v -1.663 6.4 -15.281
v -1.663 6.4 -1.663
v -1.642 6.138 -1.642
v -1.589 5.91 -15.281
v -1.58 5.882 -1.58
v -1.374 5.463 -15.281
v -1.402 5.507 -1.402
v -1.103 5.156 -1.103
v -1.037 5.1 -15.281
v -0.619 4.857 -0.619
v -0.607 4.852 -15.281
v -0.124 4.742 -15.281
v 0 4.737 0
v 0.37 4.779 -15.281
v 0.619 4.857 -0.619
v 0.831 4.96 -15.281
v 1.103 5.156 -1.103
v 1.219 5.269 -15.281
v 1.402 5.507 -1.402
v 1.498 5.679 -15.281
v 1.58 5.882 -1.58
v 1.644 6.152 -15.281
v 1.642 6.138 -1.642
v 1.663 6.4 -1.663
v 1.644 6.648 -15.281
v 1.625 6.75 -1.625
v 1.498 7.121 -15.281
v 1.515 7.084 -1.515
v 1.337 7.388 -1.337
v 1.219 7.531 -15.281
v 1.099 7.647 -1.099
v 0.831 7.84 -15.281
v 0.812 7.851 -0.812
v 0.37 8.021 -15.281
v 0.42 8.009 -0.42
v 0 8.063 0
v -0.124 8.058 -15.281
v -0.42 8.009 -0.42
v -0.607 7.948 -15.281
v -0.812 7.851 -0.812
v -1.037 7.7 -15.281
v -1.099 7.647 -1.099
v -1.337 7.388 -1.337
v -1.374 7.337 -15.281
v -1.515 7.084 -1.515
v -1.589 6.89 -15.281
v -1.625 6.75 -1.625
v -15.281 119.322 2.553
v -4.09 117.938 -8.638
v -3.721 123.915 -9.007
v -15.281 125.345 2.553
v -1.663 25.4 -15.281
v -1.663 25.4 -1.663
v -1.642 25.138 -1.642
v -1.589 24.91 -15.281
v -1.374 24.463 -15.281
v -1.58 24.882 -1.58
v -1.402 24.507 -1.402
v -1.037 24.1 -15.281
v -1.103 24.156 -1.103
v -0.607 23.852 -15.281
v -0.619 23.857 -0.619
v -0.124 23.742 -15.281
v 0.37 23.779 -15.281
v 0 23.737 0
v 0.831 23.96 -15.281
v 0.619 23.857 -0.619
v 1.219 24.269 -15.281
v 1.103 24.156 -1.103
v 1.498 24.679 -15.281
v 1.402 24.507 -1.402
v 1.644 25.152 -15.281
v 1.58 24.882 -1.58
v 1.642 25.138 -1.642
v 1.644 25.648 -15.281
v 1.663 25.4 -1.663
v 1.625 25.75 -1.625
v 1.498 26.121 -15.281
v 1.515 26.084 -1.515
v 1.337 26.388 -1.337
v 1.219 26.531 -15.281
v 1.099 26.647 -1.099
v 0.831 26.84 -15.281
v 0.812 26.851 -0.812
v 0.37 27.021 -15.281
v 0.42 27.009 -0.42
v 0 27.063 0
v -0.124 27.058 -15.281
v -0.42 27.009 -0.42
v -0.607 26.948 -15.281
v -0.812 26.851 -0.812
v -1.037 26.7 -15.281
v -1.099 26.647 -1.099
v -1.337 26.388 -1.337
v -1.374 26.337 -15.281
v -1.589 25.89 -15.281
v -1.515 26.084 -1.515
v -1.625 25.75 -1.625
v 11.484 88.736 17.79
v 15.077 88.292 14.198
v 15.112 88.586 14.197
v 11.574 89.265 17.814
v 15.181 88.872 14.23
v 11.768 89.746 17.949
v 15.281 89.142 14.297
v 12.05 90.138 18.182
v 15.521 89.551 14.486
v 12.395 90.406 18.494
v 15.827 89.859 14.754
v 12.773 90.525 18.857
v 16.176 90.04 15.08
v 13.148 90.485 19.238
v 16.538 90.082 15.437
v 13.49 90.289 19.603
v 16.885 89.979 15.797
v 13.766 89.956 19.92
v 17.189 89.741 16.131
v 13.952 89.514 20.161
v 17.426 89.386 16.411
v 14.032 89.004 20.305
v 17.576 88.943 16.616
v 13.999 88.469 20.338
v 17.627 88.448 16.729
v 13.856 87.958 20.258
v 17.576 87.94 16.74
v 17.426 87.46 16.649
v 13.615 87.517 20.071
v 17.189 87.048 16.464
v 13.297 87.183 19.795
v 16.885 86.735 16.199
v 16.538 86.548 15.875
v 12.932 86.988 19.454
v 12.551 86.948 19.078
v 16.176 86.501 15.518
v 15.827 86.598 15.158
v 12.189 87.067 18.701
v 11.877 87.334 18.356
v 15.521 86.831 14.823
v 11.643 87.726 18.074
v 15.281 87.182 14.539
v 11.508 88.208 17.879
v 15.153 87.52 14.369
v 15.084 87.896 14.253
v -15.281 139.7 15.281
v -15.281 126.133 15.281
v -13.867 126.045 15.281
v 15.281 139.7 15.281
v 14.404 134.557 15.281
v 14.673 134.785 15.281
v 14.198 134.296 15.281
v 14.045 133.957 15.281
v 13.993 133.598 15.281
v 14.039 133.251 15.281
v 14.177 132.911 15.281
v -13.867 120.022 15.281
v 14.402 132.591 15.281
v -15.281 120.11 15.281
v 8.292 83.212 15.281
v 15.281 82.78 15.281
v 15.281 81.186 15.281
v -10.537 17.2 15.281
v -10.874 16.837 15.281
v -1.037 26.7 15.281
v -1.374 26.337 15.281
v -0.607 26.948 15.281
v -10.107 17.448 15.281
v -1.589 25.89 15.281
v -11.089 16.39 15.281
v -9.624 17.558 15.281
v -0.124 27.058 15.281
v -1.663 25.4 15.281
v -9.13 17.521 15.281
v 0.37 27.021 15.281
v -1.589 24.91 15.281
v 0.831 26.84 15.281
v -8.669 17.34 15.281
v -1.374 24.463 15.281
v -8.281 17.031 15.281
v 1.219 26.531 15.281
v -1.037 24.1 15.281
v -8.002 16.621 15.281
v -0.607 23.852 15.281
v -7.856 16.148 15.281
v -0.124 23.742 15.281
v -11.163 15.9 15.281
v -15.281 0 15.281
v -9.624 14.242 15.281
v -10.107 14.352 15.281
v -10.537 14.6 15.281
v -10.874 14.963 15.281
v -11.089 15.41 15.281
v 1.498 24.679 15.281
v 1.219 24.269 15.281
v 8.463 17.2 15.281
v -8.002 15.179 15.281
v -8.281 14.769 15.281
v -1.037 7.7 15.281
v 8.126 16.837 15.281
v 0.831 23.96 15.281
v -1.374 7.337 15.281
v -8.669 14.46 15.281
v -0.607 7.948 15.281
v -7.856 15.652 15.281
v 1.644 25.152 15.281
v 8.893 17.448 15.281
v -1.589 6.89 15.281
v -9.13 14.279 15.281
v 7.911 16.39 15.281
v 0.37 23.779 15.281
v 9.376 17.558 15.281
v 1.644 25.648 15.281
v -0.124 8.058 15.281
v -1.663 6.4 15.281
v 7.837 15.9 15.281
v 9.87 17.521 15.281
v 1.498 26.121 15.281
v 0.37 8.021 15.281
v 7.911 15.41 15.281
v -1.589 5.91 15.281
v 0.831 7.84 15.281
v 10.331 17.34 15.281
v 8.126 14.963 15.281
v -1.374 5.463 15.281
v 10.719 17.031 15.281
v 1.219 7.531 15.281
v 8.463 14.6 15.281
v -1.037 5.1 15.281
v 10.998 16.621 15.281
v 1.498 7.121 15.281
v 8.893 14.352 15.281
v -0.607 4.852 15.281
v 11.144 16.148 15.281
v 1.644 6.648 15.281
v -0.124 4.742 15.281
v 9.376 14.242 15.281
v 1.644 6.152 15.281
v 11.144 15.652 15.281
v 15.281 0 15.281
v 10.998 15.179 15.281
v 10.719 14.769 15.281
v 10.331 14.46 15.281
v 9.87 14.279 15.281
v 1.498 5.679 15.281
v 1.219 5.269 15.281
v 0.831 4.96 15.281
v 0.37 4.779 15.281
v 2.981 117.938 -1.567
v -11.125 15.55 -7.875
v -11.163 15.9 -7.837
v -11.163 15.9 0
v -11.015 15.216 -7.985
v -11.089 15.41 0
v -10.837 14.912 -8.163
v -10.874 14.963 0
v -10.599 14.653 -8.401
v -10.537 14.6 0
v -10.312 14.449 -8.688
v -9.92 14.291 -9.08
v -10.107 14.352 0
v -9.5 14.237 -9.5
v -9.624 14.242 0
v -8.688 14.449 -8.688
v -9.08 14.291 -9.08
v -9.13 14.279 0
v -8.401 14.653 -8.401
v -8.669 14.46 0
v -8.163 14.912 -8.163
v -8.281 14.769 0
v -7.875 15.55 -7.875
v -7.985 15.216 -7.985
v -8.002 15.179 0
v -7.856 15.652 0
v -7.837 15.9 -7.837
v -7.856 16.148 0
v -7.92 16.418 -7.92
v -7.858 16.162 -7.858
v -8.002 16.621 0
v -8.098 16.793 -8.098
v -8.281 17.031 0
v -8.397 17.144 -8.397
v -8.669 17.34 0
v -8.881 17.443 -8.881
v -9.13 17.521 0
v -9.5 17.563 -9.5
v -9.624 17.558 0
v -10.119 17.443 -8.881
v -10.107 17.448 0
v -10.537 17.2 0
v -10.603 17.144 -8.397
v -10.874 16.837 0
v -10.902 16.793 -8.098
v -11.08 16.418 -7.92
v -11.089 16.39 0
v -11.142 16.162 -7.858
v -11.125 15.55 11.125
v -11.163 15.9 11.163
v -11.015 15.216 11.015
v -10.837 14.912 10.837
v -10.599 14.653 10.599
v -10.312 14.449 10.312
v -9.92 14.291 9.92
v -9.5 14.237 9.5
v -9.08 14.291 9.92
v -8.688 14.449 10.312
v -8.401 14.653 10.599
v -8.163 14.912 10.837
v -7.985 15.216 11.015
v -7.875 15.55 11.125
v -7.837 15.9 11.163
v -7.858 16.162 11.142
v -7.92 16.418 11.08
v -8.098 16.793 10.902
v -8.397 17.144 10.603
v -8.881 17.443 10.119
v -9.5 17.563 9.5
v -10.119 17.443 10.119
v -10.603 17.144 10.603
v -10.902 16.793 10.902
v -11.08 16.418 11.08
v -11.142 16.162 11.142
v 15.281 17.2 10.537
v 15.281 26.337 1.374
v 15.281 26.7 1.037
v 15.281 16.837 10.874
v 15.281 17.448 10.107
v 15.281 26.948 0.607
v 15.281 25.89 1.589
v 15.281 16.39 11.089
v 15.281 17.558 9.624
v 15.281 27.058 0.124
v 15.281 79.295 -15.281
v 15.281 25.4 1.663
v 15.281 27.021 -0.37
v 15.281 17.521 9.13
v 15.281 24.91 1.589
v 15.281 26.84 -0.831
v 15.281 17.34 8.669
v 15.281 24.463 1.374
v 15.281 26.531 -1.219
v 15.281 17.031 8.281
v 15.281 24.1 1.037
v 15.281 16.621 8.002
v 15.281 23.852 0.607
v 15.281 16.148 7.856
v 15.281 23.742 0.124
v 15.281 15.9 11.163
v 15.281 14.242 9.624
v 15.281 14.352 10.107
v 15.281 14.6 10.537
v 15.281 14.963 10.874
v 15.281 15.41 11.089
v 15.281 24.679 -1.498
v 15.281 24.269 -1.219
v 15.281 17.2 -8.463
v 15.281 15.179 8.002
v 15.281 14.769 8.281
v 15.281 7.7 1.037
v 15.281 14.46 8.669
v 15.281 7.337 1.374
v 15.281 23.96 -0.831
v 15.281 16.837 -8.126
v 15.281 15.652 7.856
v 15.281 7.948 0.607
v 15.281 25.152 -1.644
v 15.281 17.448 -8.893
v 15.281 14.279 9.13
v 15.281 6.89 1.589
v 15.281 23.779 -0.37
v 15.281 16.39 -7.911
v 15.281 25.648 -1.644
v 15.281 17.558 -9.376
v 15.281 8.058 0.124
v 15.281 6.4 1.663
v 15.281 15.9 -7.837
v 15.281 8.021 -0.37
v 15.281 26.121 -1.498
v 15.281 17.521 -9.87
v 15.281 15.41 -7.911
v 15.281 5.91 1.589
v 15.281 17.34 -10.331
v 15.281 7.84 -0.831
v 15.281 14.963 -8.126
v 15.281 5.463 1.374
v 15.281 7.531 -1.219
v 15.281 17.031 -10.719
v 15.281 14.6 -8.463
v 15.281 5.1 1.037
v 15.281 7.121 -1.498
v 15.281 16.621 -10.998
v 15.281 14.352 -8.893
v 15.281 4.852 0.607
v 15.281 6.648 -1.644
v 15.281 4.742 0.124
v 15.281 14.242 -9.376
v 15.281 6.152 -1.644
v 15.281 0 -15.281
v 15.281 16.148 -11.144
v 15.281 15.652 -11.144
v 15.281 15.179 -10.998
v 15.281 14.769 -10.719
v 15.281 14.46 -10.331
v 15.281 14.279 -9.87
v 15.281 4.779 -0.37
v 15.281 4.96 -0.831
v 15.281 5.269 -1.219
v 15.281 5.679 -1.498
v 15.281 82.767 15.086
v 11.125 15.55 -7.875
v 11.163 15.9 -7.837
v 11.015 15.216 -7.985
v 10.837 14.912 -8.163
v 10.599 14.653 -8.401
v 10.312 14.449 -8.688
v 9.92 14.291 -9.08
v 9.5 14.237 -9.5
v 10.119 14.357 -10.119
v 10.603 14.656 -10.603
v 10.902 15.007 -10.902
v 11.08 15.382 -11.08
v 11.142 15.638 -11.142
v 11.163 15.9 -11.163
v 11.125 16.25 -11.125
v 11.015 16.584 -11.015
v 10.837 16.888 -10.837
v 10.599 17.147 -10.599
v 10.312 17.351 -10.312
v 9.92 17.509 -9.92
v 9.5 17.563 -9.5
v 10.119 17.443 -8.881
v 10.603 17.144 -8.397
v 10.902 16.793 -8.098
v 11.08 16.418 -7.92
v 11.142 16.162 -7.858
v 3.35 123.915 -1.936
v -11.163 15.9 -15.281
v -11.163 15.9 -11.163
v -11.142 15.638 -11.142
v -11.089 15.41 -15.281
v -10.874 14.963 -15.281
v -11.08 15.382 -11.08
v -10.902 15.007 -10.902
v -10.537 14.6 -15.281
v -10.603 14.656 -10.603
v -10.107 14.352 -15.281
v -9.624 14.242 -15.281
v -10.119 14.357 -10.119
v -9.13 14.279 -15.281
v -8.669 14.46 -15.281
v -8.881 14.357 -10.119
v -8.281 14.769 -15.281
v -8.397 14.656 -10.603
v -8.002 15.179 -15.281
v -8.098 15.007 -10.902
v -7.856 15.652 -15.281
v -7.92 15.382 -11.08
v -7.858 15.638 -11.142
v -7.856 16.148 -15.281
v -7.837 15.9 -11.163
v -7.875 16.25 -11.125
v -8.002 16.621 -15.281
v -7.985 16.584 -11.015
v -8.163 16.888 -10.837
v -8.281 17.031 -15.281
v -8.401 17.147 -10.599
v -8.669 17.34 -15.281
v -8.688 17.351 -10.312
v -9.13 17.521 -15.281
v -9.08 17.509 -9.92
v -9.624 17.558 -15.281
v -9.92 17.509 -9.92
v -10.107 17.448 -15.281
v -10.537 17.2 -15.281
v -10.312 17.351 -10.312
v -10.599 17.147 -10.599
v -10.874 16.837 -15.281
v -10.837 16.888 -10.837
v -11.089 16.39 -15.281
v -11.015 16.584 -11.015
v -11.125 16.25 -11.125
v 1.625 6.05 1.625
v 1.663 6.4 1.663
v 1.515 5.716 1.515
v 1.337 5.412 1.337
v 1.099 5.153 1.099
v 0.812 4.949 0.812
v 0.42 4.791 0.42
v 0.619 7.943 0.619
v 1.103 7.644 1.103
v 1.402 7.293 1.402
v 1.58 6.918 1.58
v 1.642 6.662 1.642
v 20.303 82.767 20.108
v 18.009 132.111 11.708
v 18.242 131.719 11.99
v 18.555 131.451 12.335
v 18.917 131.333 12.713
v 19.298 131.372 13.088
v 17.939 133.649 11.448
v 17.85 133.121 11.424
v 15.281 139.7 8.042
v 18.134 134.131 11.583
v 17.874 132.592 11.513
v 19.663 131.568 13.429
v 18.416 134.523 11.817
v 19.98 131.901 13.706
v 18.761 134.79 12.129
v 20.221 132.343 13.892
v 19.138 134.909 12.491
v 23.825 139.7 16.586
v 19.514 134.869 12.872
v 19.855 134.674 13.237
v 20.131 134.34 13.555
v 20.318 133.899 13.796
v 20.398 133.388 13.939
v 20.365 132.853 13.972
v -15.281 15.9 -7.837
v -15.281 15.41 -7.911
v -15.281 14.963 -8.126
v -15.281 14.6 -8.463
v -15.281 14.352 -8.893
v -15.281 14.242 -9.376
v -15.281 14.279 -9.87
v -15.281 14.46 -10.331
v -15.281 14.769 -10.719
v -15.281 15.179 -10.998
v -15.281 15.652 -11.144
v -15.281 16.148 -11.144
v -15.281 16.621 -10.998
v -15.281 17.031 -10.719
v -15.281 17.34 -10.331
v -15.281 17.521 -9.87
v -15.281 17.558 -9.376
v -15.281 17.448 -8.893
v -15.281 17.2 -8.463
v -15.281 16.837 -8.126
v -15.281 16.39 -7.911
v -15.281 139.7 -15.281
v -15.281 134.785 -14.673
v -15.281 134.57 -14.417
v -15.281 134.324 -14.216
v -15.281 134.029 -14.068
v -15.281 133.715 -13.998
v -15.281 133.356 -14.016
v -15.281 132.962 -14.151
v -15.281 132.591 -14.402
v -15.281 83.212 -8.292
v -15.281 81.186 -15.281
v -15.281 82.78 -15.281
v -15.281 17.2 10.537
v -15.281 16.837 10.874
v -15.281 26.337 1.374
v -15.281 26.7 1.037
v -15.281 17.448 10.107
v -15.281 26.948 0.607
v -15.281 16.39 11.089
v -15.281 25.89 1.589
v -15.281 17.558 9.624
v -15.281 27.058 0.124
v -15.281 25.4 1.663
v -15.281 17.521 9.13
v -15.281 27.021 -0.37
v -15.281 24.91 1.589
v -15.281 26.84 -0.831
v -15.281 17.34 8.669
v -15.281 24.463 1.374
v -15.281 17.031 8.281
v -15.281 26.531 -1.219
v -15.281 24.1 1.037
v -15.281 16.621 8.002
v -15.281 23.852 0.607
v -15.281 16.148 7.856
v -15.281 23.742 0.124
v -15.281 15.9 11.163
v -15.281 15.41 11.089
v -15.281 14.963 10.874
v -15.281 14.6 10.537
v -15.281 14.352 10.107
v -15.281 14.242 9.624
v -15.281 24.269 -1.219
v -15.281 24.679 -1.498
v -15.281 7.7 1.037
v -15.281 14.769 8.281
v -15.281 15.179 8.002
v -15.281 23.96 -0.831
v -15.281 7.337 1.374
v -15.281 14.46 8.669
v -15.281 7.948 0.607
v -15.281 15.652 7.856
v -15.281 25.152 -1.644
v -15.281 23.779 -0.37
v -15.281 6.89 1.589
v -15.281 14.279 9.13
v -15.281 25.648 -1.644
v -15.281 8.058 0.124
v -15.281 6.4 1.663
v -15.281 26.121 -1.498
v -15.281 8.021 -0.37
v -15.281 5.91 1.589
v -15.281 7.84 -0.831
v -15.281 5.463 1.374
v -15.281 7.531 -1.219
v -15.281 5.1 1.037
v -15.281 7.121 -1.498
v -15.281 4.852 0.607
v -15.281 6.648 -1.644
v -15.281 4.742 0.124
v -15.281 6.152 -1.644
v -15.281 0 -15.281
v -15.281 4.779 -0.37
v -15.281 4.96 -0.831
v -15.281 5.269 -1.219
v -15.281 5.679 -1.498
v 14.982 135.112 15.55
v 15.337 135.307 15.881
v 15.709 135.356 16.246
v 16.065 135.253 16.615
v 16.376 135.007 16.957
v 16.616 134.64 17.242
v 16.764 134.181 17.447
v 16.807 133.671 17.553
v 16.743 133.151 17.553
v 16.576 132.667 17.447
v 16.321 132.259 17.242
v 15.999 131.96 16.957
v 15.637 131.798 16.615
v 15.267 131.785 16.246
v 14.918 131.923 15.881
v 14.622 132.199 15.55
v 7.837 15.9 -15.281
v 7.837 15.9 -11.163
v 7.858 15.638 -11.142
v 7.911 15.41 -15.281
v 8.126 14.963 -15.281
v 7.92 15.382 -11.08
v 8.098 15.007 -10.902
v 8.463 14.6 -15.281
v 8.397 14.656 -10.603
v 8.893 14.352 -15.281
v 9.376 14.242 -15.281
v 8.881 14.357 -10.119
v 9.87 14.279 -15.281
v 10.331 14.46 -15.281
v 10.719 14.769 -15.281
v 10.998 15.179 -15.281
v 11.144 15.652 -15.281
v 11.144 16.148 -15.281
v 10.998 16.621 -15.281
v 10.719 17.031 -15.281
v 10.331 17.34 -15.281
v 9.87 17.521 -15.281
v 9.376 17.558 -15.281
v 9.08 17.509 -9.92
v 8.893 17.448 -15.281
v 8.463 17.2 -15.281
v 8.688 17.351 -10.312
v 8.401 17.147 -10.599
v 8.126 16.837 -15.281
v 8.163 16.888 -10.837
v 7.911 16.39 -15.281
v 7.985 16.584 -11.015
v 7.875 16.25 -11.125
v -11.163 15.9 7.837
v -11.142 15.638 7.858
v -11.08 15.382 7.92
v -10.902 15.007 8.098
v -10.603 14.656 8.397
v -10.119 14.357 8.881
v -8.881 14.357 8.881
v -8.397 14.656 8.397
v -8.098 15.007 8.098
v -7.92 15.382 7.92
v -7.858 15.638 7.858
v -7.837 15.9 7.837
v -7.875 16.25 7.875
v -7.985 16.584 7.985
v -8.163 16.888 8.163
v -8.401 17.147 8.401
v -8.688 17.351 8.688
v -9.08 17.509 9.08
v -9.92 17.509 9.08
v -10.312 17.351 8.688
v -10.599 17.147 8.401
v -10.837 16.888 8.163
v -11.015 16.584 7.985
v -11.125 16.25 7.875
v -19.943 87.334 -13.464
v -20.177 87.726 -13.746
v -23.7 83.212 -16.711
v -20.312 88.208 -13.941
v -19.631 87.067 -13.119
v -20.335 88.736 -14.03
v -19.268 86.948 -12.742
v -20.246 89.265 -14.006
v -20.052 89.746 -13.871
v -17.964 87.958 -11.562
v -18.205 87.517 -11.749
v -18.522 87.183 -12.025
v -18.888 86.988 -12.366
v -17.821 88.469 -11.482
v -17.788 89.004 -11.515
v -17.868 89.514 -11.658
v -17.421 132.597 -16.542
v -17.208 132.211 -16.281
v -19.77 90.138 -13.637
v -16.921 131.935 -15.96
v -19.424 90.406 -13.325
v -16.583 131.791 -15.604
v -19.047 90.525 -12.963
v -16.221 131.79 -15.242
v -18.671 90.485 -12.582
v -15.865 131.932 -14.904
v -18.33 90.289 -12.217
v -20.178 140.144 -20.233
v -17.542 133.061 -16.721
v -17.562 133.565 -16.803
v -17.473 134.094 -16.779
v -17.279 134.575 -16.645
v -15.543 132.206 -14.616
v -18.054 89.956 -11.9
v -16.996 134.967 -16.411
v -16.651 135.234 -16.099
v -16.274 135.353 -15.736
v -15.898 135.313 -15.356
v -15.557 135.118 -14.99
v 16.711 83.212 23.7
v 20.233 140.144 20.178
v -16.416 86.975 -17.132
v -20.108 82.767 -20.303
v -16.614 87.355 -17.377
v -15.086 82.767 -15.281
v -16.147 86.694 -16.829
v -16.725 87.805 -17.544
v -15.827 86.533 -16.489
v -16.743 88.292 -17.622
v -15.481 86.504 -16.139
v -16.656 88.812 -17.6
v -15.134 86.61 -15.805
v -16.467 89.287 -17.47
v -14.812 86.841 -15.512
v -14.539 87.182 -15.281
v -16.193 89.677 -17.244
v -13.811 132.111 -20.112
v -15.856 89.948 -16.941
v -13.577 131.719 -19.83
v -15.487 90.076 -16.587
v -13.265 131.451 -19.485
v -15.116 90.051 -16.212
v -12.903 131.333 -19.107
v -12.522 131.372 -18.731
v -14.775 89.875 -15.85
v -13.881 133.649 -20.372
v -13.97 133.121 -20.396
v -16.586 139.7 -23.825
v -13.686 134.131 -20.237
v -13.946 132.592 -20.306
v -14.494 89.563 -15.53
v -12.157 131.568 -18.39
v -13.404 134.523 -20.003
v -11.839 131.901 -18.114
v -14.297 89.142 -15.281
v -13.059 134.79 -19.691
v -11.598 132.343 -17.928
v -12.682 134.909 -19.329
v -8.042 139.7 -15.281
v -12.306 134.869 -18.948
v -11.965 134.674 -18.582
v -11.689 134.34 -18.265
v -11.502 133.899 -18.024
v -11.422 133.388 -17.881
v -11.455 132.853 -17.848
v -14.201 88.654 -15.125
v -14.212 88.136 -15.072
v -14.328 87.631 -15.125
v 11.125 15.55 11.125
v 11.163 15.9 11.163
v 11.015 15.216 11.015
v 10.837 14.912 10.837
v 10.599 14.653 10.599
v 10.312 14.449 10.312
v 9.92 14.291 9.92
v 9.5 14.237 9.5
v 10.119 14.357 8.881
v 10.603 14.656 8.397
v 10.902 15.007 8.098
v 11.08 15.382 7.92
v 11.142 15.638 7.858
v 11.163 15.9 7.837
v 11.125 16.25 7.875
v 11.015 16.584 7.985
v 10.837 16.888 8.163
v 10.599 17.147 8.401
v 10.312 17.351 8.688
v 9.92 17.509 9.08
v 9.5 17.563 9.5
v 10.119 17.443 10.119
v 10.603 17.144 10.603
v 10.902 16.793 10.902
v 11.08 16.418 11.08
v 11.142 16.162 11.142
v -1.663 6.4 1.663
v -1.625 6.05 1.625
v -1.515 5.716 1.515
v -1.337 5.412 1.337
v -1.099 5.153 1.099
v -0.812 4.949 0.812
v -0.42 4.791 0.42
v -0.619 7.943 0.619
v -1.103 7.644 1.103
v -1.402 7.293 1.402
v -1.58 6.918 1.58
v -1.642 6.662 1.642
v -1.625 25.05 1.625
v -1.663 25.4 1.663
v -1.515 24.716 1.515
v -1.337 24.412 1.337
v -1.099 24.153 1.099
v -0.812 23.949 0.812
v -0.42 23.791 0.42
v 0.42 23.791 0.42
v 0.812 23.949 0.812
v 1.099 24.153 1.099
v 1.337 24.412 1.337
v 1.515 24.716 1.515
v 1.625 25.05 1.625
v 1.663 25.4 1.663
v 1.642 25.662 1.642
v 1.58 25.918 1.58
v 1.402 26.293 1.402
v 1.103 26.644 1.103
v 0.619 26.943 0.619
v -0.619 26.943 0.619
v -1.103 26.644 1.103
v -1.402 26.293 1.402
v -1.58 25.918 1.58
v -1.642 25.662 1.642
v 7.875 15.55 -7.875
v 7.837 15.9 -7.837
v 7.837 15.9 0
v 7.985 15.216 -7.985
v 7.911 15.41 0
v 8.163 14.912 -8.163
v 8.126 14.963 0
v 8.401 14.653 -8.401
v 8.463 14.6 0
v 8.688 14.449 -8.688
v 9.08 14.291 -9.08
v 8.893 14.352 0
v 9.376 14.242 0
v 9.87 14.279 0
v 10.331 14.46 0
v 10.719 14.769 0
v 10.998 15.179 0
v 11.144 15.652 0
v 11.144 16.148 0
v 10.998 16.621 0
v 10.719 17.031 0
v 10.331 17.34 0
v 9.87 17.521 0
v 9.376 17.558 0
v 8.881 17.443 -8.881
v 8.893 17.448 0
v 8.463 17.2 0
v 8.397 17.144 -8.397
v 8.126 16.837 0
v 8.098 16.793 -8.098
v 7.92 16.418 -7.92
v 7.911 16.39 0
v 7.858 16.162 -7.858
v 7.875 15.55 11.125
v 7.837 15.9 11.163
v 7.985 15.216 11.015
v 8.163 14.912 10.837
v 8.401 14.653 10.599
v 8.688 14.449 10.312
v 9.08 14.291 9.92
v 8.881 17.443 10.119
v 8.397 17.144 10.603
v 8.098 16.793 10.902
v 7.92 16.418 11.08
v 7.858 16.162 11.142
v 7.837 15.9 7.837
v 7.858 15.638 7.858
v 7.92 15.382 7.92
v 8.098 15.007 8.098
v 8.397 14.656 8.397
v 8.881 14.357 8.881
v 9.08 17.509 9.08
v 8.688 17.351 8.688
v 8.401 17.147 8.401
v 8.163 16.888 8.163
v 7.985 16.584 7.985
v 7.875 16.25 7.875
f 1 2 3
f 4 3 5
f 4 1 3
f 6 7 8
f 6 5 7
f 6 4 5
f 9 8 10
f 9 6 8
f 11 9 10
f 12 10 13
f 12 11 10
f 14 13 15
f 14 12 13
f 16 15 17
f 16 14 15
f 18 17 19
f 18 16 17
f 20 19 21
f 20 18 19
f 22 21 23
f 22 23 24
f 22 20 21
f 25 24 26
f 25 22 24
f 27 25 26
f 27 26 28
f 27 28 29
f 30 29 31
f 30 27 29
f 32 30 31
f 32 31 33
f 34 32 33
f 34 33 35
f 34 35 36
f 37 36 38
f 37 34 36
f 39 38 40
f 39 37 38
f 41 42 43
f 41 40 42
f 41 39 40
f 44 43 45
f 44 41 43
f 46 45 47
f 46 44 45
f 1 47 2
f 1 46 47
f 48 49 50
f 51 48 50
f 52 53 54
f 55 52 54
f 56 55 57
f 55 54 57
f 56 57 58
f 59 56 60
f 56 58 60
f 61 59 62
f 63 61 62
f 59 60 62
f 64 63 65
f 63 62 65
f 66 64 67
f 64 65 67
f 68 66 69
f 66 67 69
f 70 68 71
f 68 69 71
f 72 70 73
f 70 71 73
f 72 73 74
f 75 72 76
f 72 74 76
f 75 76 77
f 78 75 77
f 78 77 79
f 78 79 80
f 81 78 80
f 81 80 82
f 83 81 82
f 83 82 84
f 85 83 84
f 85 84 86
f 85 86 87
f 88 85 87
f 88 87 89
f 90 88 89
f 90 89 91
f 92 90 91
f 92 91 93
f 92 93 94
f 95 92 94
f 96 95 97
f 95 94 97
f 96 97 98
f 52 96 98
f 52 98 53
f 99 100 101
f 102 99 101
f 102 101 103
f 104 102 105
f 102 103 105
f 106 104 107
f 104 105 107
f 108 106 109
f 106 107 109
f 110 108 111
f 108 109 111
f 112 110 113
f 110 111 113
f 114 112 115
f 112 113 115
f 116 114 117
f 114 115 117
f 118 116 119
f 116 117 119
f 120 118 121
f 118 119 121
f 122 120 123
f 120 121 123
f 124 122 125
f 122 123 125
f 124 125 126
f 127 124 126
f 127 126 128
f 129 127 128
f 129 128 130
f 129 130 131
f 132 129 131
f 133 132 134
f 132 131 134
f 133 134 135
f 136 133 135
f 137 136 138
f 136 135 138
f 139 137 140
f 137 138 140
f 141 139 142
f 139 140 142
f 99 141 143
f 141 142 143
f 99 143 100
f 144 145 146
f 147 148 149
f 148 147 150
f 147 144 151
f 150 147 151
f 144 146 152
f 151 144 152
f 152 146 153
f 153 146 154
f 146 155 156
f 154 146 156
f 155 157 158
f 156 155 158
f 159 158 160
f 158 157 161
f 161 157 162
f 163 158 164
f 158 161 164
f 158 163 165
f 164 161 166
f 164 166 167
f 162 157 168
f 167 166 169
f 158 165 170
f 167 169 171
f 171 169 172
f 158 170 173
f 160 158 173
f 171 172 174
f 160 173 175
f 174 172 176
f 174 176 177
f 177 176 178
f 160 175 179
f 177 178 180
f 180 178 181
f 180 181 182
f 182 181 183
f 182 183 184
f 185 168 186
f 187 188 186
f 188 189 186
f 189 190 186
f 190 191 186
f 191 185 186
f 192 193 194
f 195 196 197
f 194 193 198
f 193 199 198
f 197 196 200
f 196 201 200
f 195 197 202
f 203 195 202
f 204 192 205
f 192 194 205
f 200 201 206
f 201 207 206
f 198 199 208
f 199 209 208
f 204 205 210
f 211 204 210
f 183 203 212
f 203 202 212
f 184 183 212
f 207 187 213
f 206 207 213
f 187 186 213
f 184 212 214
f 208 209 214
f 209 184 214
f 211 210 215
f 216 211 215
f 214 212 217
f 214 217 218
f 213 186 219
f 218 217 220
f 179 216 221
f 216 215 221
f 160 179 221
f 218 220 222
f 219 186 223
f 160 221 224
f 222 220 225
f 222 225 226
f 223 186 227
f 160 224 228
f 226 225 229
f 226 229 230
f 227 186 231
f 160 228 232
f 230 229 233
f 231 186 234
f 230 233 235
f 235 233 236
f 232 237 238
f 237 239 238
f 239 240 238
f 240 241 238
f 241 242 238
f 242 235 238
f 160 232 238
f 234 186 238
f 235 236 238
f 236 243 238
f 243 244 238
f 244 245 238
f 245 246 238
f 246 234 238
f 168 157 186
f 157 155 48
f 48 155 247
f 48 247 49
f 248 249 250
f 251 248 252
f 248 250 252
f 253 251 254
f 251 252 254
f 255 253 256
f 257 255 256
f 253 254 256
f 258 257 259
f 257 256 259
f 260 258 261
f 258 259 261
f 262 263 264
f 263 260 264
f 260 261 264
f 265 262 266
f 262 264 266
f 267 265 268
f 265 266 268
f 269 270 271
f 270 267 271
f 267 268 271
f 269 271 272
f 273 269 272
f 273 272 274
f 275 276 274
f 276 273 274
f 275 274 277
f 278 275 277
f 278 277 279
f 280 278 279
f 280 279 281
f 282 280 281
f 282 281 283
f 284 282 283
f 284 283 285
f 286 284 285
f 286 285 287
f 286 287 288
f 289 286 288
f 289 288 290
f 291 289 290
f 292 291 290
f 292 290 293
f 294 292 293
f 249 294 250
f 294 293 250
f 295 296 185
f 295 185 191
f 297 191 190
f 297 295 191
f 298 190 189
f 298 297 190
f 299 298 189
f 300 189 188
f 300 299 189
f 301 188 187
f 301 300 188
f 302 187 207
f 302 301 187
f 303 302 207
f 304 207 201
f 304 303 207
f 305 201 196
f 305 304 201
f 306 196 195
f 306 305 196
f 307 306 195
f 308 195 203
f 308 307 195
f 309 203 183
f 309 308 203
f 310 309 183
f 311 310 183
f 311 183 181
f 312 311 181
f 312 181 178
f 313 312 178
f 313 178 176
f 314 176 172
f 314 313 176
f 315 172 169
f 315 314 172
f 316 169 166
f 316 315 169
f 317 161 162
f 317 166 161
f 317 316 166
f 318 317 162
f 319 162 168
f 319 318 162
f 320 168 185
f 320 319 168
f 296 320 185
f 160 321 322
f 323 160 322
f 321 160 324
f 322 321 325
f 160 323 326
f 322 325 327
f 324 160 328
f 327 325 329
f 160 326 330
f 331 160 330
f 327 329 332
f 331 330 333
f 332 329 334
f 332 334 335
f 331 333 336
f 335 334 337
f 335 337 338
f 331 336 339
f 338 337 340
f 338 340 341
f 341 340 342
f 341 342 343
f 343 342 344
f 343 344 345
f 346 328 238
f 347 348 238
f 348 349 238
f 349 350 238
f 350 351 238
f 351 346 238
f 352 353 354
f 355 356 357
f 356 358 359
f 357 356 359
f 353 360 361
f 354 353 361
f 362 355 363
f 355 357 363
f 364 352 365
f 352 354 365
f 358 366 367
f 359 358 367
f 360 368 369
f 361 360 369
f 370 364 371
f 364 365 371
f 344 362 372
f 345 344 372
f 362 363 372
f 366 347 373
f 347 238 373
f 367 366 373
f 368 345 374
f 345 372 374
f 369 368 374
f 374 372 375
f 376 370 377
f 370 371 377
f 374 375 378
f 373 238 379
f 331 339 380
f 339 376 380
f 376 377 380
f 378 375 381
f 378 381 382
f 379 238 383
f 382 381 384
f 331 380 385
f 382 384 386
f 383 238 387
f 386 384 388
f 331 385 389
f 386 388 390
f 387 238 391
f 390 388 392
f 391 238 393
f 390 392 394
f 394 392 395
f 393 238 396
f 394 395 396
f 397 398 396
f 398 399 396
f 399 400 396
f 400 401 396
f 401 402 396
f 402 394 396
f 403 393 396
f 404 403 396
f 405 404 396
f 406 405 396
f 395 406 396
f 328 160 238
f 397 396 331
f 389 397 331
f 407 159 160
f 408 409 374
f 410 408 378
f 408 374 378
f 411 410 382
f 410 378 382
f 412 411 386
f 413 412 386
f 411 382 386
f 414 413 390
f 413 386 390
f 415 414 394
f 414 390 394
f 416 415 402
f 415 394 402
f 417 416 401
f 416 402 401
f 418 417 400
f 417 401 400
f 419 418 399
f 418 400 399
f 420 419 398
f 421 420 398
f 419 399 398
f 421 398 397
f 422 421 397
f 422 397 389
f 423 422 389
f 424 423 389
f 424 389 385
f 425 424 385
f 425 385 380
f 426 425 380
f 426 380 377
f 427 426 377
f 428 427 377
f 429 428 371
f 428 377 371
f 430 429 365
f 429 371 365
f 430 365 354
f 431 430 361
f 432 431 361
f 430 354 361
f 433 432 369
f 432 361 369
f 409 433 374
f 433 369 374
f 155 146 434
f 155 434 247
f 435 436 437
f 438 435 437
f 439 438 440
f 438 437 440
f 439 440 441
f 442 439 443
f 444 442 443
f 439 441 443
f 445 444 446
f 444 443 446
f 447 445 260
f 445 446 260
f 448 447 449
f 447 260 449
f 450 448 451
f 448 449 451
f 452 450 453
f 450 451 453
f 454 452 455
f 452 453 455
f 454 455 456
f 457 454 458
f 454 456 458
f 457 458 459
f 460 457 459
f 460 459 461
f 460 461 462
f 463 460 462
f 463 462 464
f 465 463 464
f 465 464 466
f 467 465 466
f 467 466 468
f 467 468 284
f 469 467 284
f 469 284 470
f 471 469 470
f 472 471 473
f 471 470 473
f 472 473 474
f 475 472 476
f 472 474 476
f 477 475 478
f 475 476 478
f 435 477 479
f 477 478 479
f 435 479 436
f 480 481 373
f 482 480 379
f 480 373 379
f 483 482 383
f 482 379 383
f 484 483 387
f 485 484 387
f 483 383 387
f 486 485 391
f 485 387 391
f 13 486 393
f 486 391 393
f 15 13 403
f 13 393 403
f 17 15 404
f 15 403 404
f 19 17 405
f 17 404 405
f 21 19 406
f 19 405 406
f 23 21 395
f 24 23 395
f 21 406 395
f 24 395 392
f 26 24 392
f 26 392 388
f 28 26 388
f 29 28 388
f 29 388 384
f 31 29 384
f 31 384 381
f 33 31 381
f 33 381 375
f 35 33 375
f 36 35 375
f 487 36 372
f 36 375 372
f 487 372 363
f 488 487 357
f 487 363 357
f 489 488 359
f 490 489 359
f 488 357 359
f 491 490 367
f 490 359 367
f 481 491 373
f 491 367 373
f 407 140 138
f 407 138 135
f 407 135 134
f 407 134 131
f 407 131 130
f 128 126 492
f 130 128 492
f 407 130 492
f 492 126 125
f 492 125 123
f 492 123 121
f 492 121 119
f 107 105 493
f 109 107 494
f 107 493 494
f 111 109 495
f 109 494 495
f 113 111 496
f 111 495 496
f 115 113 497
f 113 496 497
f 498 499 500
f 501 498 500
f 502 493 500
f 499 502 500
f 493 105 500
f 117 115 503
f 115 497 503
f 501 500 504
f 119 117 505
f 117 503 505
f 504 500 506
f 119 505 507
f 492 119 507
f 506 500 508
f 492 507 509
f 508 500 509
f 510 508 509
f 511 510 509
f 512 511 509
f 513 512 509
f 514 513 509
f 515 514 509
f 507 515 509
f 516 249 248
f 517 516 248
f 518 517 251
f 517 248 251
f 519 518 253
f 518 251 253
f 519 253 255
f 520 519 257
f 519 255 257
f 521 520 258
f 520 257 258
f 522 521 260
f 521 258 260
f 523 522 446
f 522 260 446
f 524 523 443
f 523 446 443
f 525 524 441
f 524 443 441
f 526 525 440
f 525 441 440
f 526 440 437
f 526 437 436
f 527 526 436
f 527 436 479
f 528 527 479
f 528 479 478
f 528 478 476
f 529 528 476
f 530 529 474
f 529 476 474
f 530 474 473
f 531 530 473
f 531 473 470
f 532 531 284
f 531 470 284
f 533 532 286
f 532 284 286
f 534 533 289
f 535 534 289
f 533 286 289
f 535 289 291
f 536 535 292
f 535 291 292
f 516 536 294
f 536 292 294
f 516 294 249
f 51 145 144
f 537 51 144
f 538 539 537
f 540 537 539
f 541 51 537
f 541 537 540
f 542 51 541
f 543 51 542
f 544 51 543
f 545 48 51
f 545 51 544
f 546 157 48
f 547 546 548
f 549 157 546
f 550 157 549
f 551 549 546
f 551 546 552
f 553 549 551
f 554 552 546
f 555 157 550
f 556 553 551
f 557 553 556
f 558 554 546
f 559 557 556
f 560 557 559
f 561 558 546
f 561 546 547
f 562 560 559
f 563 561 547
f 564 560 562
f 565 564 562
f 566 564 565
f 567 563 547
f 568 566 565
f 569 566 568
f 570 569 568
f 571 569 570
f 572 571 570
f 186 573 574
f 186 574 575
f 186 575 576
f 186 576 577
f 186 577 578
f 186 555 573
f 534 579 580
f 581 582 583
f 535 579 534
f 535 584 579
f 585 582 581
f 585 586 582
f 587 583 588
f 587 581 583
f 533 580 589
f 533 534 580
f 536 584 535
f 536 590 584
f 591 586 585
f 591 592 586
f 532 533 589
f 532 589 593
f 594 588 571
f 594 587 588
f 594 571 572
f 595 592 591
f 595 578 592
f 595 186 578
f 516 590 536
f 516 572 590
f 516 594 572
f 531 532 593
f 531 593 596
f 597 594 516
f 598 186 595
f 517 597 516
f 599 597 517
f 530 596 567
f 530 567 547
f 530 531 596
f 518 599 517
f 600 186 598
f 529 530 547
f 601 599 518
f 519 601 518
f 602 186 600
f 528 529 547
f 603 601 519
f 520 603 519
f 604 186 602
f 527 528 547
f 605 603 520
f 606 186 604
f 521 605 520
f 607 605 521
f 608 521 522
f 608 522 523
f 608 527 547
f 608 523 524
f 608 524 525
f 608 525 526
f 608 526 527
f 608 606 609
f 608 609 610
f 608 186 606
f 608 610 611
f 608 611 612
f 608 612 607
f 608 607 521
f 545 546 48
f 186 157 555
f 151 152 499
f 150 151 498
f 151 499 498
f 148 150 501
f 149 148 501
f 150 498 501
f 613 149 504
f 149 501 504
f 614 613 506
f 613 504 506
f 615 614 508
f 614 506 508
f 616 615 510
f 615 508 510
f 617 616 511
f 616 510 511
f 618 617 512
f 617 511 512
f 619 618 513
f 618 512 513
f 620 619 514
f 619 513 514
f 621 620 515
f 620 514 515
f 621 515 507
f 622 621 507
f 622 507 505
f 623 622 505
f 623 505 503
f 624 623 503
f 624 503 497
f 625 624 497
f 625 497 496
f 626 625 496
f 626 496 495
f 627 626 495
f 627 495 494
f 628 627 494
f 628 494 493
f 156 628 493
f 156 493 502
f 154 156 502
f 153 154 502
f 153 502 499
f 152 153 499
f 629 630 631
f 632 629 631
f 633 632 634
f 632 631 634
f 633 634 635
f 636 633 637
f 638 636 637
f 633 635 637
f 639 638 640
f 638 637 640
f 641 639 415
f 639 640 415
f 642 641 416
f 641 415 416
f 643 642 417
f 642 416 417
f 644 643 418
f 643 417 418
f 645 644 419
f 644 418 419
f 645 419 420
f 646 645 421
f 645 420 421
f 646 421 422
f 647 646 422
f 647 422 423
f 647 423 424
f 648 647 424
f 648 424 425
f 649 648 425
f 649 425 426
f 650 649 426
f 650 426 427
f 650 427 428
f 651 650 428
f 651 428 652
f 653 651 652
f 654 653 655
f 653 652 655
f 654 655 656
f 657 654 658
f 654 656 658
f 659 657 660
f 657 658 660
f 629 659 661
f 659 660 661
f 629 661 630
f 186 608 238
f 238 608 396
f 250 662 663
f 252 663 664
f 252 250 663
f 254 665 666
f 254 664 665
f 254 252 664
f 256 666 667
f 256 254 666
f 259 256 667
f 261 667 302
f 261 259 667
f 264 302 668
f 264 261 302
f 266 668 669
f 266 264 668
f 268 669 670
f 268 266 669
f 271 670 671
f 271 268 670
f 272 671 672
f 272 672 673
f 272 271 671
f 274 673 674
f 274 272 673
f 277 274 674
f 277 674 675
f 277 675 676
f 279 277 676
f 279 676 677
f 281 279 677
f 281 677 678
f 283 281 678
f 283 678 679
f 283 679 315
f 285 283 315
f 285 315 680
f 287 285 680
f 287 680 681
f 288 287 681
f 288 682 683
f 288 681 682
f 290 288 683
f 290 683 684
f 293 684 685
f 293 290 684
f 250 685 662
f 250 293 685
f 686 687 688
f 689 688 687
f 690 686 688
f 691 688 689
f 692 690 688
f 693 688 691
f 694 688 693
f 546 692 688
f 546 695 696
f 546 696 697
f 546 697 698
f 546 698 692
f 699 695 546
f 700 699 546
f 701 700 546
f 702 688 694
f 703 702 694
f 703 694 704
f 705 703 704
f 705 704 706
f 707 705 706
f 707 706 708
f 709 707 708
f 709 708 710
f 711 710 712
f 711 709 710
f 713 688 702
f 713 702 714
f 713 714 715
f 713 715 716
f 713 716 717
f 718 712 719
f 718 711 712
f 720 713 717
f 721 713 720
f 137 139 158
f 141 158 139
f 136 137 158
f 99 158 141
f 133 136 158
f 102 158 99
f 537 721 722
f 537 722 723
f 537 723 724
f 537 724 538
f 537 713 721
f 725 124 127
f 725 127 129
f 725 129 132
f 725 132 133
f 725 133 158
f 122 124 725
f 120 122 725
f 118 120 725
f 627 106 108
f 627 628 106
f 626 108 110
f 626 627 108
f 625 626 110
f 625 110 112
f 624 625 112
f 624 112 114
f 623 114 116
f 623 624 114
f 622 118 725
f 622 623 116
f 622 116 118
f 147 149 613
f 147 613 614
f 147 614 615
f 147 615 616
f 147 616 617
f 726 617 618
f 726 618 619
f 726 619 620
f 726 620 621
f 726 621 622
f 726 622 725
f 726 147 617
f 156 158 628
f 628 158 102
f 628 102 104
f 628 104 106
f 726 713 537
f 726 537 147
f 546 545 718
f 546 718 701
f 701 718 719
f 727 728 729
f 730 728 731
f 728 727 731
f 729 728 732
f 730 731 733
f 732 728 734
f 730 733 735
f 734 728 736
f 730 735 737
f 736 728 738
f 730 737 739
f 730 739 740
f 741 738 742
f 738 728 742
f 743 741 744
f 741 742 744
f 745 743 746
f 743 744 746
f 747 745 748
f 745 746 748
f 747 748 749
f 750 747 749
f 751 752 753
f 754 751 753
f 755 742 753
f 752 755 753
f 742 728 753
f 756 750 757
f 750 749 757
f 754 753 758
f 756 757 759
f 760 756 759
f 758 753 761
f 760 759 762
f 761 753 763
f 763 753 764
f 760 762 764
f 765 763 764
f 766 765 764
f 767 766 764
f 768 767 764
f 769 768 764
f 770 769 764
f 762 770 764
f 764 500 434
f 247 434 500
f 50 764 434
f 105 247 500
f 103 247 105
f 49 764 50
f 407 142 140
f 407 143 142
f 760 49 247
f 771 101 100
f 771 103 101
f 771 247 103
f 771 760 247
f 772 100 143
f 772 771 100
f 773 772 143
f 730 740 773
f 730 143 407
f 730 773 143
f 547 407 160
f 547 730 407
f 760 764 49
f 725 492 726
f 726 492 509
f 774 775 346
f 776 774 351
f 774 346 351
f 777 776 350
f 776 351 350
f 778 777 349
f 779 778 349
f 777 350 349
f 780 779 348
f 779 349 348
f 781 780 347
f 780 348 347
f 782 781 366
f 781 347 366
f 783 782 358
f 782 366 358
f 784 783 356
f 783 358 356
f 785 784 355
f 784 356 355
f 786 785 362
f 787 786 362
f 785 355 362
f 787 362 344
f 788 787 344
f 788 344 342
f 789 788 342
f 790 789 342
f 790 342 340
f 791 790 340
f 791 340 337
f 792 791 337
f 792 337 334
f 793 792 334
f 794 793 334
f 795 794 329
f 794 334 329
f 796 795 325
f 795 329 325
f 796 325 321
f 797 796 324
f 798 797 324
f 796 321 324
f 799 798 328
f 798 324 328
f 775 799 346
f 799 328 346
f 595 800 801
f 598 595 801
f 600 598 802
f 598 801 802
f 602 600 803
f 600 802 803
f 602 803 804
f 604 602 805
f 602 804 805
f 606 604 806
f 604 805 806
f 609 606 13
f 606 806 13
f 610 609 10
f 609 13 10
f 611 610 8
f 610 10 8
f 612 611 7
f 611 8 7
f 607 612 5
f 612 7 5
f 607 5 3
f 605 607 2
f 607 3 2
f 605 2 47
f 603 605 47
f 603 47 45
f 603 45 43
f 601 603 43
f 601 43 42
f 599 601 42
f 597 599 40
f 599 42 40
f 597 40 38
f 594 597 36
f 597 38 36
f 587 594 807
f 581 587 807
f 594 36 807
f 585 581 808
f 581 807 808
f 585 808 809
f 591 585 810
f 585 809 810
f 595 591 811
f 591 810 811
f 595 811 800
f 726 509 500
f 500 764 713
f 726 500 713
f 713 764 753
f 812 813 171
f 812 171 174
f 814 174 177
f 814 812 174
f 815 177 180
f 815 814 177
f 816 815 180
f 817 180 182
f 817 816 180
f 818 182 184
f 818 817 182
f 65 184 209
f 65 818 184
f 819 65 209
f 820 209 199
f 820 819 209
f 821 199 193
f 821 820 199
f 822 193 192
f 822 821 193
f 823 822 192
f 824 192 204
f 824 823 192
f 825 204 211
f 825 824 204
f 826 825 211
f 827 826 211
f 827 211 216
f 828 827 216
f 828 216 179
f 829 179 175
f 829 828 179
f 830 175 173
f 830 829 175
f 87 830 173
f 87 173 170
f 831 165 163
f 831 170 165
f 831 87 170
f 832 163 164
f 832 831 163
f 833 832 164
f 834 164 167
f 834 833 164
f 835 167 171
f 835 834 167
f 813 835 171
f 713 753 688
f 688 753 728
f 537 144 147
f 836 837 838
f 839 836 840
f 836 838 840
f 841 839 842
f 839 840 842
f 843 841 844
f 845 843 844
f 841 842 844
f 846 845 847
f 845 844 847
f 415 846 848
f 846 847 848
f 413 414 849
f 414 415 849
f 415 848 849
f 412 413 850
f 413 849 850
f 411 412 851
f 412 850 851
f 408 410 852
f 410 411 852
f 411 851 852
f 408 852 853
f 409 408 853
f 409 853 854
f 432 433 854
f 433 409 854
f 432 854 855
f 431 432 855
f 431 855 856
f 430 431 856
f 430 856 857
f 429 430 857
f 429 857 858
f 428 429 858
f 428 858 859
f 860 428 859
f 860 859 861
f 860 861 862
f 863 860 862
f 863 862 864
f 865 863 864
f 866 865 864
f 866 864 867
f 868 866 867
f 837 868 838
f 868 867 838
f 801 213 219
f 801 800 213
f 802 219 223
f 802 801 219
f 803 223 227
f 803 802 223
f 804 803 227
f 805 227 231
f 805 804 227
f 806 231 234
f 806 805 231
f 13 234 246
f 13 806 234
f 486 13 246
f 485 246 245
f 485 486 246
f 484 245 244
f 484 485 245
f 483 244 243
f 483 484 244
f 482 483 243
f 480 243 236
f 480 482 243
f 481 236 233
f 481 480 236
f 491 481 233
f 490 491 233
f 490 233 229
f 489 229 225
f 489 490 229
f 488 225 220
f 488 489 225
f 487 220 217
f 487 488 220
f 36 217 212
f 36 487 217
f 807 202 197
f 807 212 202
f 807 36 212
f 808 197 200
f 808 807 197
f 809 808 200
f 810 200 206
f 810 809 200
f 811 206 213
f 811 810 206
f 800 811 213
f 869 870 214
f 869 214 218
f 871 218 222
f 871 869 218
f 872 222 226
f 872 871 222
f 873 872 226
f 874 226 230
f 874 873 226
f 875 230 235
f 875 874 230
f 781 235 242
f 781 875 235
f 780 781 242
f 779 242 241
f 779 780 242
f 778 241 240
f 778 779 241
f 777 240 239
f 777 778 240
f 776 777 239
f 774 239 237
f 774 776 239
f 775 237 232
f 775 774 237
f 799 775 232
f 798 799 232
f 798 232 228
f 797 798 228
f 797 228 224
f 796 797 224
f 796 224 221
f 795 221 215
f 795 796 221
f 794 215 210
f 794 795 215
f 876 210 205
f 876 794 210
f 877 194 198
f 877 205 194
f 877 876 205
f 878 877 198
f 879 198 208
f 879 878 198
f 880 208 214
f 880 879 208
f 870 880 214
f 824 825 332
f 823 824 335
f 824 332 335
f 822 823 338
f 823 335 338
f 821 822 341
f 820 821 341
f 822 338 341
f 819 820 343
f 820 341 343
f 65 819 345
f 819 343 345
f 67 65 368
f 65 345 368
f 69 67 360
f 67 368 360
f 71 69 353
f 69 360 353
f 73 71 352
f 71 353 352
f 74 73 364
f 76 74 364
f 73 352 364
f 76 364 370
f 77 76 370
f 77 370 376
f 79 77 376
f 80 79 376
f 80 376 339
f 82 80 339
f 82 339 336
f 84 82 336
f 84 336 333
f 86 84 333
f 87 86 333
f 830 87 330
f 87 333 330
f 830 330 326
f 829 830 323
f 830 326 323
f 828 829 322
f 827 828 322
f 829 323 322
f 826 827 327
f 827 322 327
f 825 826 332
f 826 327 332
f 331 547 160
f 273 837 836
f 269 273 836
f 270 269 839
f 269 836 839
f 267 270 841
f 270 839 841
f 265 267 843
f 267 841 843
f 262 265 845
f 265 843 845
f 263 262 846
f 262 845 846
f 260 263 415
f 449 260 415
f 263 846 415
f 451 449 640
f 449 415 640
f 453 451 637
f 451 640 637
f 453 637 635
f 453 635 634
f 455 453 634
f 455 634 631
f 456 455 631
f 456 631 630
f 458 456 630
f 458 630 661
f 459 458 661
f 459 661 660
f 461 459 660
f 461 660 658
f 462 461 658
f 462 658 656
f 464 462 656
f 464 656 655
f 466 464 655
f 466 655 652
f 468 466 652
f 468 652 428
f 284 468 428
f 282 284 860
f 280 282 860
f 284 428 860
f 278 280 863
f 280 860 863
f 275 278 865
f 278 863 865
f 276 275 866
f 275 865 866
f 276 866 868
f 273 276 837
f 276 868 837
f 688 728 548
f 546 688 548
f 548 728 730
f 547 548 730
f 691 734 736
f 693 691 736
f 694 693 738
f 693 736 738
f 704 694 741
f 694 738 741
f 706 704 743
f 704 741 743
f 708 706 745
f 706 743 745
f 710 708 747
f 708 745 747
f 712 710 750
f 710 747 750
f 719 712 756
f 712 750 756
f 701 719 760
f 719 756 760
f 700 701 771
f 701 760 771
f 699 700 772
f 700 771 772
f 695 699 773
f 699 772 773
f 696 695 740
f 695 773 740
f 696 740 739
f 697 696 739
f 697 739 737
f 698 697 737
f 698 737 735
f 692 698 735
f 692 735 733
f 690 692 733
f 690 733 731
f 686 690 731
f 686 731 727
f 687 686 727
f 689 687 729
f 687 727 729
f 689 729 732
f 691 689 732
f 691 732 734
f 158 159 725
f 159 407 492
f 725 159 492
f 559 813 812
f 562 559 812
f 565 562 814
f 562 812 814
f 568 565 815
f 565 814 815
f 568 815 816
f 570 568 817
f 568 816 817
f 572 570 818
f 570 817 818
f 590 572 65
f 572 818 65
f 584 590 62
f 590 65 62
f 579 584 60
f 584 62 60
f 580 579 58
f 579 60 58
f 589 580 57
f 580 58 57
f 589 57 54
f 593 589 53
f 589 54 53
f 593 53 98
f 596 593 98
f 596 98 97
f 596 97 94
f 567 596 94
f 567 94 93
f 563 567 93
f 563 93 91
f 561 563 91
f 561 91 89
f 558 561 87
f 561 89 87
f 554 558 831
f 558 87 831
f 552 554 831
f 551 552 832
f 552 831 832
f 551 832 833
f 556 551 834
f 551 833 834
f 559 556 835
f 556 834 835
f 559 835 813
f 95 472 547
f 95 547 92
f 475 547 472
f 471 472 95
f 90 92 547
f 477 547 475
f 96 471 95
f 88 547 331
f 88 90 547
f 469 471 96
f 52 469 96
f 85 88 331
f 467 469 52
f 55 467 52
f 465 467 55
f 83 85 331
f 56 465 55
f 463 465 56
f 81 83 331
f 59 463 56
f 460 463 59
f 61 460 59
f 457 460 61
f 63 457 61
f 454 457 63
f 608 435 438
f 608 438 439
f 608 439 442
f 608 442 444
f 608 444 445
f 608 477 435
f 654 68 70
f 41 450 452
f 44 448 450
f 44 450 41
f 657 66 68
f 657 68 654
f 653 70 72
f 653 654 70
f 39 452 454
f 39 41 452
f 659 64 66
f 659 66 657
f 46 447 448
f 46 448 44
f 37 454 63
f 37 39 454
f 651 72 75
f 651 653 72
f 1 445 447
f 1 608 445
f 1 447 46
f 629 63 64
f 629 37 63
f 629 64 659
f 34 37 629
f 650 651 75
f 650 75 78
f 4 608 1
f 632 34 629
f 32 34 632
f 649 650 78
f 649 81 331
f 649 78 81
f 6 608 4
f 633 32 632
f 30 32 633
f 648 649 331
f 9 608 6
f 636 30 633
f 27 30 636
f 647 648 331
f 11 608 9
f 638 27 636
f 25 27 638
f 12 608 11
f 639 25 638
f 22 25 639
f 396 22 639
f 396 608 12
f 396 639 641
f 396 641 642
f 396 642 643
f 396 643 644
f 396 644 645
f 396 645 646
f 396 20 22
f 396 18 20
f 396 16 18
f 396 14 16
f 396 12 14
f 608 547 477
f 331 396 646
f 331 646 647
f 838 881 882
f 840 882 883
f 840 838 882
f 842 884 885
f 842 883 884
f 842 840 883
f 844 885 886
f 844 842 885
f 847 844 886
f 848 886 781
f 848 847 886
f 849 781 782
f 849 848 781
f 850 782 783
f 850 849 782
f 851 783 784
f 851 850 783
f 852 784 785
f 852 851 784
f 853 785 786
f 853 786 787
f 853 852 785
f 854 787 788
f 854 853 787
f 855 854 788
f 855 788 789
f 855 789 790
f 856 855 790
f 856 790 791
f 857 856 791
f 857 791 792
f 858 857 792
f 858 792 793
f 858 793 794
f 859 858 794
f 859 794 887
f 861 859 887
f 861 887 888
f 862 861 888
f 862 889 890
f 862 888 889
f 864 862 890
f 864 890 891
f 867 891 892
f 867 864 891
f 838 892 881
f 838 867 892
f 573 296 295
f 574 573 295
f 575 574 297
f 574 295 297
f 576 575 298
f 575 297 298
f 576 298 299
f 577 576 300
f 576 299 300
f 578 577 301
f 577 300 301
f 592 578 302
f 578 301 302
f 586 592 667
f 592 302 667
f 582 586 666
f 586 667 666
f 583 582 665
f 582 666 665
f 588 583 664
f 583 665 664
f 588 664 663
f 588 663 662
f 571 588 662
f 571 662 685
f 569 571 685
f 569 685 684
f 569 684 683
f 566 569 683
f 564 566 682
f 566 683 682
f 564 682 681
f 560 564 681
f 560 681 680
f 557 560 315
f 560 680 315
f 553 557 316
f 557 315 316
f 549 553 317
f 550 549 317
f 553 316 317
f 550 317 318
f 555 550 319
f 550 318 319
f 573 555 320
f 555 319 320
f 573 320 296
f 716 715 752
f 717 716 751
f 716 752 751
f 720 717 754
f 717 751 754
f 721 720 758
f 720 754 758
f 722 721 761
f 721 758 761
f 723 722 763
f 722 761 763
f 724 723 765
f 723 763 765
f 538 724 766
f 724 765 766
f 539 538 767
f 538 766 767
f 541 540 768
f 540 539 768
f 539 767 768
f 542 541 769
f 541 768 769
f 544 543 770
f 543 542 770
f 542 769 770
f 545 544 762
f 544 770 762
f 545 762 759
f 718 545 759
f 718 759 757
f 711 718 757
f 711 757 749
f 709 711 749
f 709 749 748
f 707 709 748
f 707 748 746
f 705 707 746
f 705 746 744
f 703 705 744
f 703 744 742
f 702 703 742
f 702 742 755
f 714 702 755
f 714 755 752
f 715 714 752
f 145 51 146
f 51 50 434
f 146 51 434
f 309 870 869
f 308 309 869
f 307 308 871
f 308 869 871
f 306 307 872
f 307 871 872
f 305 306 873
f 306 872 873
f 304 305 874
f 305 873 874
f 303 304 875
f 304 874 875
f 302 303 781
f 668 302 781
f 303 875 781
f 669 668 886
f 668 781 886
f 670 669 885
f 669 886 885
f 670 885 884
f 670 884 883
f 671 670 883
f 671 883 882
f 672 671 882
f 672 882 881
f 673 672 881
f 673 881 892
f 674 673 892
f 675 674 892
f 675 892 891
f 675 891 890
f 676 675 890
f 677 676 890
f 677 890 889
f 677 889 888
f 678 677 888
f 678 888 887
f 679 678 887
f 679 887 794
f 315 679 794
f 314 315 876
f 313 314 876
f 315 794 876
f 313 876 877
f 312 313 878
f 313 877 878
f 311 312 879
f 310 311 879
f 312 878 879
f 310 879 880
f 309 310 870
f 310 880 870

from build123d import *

# Parameters (mm, degrees)
SKETCH1_W               = 30.562599784
SKETCH1_H               = 30.562599784
BOSS_EXTRUDE1_DEPTH     = 139.7
CUT_EXTRUDE1_DEPTH      = 142.361685943
CUT_EXTRUDE1_DEPTH_BACK = 142.361685943
BOSS_EXTRUDE2_DEPTH     = 5.09983
SKETCH5_R               = 1.8
CUT_EXTRUDE2_DEPTH      = 146.354775845
SKETCH6_R               = 1.662500104
CUT_EXTRUDE3_DEPTH      = 145.138064655


with BuildPart() as part:
    # Sketch1 → Boss-Extrude1 (new body)
    with BuildSketch(Plane(origin=(0, 0, 0), x_dir=(1, 0, 0), z_dir=(0, 1, 0))):
        Rectangle(SKETCH1_W, SKETCH1_H)
    extrude(amount=BOSS_EXTRUDE1_DEPTH)

    # Sketch2 → Cut-Extrude1 (cut, two sides: drawn at the far end of the back side and taken through both)
    with BuildSketch(Plane(origin=(0, 0, 0), x_dir=(0.7071067811865477, 0, -0.7071067811865475), z_dir=(0.7071067811865475, 0, 0.7071067811865477)).offset(-CUT_EXTRUDE1_DEPTH_BACK)):
        Polygon((5.11931044, 139.7), (0, 81.186013921), (21.611021558, 79.295294527), (21.611021558, 139.7), align=None)
    extrude(amount=CUT_EXTRUDE1_DEPTH + CUT_EXTRUDE1_DEPTH_BACK, mode=Mode.SUBTRACT)

    # Sketch4 → Boss-Extrude2 (add)
    with BuildSketch(Plane(origin=(-4.984326181, 0.616698988, 4.984326181), x_dir=(-0.6990853645605906, 0.08649619246092877, -0.7097873355780225), z_dir=(0.704416026402759, -0.08715574274765817, -0.7044160264027586))):
        Polygon((-16.344826658, 141.568383735), (40.589342943, 136.606243895), (35.627203104, 79.672074294), (-21.306966498, 84.634214133), align=None)
    extrude(amount=-BOSS_EXTRUDE2_DEPTH)

    # Sketch5 → Cut-Extrude2 (cut, through all)
    with BuildSketch(Plane(origin=(-4.984326181, 0.616698988, 4.984326181), x_dir=(-0.6990853645605907, 0.08649619246092867, -0.7097873355780224), z_dir=(0.7044160264027588, -0.08715574274765812, -0.7044160264027586))):
        with Locations(Location((33.963841811, 130.554186497, 0), (0, 0, 355.018930606))):
            Circle(SKETCH5_R)
        with Locations(Location((-10.866212993, 134.461383221, 0), (0, 0, 355.018930606))):
            Circle(SKETCH5_R)
        with Locations(Location((-14.773409717, 89.631328416, 0), (0, 0, 355.018930606))):
            Circle(SKETCH5_R)
        with Locations(Location((30.056645087, 85.724131693, 0), (0, 0, 355.018930606))):
            Circle(SKETCH5_R)
        Polygon((19.712476114, 122.520420225), (9.750241713, 123.388686164), (9.22928215, 117.411345523), (19.191516551, 116.543079585), align=None)
    extrude(amount=-CUT_EXTRUDE2_DEPTH, mode=Mode.SUBTRACT)

    # Sketch6 → Cut-Extrude3 (cut, symmetric)
    with BuildSketch(Plane(origin=(0, 0, 0), x_dir=(0, 0, -1), z_dir=(1, 0, 0))):
        with Locations(Location((0, 25.4, 0), (0, 0, 180))):
            Circle(SKETCH6_R)
        with Locations(Location((-9.5, 15.9, 0), (0, 0, 180))):
            Circle(SKETCH6_R)
        with Locations(Location((9.5, 15.9, 0), (0, 0, 180))):
            Circle(SKETCH6_R)
        with Locations(Location((0, 6.4, 0), (0, 0, 180))):
            Circle(SKETCH6_R)
    cut_extrude3 = extrude(amount=CUT_EXTRUDE3_DEPTH, both=True, mode=Mode.SUBTRACT)

    # Mirror1: Cut-Extrude3 across plane
    add(cut_extrude3.mirror(Plane(origin=(0, 0, 0), x_dir=(-0.7071067811865478, 0, 0.7071067811865472), z_dir=(0.7071067811865475, 0, 0.7071067811865477))), mode=Mode.SUBTRACT)


solid = part.part
